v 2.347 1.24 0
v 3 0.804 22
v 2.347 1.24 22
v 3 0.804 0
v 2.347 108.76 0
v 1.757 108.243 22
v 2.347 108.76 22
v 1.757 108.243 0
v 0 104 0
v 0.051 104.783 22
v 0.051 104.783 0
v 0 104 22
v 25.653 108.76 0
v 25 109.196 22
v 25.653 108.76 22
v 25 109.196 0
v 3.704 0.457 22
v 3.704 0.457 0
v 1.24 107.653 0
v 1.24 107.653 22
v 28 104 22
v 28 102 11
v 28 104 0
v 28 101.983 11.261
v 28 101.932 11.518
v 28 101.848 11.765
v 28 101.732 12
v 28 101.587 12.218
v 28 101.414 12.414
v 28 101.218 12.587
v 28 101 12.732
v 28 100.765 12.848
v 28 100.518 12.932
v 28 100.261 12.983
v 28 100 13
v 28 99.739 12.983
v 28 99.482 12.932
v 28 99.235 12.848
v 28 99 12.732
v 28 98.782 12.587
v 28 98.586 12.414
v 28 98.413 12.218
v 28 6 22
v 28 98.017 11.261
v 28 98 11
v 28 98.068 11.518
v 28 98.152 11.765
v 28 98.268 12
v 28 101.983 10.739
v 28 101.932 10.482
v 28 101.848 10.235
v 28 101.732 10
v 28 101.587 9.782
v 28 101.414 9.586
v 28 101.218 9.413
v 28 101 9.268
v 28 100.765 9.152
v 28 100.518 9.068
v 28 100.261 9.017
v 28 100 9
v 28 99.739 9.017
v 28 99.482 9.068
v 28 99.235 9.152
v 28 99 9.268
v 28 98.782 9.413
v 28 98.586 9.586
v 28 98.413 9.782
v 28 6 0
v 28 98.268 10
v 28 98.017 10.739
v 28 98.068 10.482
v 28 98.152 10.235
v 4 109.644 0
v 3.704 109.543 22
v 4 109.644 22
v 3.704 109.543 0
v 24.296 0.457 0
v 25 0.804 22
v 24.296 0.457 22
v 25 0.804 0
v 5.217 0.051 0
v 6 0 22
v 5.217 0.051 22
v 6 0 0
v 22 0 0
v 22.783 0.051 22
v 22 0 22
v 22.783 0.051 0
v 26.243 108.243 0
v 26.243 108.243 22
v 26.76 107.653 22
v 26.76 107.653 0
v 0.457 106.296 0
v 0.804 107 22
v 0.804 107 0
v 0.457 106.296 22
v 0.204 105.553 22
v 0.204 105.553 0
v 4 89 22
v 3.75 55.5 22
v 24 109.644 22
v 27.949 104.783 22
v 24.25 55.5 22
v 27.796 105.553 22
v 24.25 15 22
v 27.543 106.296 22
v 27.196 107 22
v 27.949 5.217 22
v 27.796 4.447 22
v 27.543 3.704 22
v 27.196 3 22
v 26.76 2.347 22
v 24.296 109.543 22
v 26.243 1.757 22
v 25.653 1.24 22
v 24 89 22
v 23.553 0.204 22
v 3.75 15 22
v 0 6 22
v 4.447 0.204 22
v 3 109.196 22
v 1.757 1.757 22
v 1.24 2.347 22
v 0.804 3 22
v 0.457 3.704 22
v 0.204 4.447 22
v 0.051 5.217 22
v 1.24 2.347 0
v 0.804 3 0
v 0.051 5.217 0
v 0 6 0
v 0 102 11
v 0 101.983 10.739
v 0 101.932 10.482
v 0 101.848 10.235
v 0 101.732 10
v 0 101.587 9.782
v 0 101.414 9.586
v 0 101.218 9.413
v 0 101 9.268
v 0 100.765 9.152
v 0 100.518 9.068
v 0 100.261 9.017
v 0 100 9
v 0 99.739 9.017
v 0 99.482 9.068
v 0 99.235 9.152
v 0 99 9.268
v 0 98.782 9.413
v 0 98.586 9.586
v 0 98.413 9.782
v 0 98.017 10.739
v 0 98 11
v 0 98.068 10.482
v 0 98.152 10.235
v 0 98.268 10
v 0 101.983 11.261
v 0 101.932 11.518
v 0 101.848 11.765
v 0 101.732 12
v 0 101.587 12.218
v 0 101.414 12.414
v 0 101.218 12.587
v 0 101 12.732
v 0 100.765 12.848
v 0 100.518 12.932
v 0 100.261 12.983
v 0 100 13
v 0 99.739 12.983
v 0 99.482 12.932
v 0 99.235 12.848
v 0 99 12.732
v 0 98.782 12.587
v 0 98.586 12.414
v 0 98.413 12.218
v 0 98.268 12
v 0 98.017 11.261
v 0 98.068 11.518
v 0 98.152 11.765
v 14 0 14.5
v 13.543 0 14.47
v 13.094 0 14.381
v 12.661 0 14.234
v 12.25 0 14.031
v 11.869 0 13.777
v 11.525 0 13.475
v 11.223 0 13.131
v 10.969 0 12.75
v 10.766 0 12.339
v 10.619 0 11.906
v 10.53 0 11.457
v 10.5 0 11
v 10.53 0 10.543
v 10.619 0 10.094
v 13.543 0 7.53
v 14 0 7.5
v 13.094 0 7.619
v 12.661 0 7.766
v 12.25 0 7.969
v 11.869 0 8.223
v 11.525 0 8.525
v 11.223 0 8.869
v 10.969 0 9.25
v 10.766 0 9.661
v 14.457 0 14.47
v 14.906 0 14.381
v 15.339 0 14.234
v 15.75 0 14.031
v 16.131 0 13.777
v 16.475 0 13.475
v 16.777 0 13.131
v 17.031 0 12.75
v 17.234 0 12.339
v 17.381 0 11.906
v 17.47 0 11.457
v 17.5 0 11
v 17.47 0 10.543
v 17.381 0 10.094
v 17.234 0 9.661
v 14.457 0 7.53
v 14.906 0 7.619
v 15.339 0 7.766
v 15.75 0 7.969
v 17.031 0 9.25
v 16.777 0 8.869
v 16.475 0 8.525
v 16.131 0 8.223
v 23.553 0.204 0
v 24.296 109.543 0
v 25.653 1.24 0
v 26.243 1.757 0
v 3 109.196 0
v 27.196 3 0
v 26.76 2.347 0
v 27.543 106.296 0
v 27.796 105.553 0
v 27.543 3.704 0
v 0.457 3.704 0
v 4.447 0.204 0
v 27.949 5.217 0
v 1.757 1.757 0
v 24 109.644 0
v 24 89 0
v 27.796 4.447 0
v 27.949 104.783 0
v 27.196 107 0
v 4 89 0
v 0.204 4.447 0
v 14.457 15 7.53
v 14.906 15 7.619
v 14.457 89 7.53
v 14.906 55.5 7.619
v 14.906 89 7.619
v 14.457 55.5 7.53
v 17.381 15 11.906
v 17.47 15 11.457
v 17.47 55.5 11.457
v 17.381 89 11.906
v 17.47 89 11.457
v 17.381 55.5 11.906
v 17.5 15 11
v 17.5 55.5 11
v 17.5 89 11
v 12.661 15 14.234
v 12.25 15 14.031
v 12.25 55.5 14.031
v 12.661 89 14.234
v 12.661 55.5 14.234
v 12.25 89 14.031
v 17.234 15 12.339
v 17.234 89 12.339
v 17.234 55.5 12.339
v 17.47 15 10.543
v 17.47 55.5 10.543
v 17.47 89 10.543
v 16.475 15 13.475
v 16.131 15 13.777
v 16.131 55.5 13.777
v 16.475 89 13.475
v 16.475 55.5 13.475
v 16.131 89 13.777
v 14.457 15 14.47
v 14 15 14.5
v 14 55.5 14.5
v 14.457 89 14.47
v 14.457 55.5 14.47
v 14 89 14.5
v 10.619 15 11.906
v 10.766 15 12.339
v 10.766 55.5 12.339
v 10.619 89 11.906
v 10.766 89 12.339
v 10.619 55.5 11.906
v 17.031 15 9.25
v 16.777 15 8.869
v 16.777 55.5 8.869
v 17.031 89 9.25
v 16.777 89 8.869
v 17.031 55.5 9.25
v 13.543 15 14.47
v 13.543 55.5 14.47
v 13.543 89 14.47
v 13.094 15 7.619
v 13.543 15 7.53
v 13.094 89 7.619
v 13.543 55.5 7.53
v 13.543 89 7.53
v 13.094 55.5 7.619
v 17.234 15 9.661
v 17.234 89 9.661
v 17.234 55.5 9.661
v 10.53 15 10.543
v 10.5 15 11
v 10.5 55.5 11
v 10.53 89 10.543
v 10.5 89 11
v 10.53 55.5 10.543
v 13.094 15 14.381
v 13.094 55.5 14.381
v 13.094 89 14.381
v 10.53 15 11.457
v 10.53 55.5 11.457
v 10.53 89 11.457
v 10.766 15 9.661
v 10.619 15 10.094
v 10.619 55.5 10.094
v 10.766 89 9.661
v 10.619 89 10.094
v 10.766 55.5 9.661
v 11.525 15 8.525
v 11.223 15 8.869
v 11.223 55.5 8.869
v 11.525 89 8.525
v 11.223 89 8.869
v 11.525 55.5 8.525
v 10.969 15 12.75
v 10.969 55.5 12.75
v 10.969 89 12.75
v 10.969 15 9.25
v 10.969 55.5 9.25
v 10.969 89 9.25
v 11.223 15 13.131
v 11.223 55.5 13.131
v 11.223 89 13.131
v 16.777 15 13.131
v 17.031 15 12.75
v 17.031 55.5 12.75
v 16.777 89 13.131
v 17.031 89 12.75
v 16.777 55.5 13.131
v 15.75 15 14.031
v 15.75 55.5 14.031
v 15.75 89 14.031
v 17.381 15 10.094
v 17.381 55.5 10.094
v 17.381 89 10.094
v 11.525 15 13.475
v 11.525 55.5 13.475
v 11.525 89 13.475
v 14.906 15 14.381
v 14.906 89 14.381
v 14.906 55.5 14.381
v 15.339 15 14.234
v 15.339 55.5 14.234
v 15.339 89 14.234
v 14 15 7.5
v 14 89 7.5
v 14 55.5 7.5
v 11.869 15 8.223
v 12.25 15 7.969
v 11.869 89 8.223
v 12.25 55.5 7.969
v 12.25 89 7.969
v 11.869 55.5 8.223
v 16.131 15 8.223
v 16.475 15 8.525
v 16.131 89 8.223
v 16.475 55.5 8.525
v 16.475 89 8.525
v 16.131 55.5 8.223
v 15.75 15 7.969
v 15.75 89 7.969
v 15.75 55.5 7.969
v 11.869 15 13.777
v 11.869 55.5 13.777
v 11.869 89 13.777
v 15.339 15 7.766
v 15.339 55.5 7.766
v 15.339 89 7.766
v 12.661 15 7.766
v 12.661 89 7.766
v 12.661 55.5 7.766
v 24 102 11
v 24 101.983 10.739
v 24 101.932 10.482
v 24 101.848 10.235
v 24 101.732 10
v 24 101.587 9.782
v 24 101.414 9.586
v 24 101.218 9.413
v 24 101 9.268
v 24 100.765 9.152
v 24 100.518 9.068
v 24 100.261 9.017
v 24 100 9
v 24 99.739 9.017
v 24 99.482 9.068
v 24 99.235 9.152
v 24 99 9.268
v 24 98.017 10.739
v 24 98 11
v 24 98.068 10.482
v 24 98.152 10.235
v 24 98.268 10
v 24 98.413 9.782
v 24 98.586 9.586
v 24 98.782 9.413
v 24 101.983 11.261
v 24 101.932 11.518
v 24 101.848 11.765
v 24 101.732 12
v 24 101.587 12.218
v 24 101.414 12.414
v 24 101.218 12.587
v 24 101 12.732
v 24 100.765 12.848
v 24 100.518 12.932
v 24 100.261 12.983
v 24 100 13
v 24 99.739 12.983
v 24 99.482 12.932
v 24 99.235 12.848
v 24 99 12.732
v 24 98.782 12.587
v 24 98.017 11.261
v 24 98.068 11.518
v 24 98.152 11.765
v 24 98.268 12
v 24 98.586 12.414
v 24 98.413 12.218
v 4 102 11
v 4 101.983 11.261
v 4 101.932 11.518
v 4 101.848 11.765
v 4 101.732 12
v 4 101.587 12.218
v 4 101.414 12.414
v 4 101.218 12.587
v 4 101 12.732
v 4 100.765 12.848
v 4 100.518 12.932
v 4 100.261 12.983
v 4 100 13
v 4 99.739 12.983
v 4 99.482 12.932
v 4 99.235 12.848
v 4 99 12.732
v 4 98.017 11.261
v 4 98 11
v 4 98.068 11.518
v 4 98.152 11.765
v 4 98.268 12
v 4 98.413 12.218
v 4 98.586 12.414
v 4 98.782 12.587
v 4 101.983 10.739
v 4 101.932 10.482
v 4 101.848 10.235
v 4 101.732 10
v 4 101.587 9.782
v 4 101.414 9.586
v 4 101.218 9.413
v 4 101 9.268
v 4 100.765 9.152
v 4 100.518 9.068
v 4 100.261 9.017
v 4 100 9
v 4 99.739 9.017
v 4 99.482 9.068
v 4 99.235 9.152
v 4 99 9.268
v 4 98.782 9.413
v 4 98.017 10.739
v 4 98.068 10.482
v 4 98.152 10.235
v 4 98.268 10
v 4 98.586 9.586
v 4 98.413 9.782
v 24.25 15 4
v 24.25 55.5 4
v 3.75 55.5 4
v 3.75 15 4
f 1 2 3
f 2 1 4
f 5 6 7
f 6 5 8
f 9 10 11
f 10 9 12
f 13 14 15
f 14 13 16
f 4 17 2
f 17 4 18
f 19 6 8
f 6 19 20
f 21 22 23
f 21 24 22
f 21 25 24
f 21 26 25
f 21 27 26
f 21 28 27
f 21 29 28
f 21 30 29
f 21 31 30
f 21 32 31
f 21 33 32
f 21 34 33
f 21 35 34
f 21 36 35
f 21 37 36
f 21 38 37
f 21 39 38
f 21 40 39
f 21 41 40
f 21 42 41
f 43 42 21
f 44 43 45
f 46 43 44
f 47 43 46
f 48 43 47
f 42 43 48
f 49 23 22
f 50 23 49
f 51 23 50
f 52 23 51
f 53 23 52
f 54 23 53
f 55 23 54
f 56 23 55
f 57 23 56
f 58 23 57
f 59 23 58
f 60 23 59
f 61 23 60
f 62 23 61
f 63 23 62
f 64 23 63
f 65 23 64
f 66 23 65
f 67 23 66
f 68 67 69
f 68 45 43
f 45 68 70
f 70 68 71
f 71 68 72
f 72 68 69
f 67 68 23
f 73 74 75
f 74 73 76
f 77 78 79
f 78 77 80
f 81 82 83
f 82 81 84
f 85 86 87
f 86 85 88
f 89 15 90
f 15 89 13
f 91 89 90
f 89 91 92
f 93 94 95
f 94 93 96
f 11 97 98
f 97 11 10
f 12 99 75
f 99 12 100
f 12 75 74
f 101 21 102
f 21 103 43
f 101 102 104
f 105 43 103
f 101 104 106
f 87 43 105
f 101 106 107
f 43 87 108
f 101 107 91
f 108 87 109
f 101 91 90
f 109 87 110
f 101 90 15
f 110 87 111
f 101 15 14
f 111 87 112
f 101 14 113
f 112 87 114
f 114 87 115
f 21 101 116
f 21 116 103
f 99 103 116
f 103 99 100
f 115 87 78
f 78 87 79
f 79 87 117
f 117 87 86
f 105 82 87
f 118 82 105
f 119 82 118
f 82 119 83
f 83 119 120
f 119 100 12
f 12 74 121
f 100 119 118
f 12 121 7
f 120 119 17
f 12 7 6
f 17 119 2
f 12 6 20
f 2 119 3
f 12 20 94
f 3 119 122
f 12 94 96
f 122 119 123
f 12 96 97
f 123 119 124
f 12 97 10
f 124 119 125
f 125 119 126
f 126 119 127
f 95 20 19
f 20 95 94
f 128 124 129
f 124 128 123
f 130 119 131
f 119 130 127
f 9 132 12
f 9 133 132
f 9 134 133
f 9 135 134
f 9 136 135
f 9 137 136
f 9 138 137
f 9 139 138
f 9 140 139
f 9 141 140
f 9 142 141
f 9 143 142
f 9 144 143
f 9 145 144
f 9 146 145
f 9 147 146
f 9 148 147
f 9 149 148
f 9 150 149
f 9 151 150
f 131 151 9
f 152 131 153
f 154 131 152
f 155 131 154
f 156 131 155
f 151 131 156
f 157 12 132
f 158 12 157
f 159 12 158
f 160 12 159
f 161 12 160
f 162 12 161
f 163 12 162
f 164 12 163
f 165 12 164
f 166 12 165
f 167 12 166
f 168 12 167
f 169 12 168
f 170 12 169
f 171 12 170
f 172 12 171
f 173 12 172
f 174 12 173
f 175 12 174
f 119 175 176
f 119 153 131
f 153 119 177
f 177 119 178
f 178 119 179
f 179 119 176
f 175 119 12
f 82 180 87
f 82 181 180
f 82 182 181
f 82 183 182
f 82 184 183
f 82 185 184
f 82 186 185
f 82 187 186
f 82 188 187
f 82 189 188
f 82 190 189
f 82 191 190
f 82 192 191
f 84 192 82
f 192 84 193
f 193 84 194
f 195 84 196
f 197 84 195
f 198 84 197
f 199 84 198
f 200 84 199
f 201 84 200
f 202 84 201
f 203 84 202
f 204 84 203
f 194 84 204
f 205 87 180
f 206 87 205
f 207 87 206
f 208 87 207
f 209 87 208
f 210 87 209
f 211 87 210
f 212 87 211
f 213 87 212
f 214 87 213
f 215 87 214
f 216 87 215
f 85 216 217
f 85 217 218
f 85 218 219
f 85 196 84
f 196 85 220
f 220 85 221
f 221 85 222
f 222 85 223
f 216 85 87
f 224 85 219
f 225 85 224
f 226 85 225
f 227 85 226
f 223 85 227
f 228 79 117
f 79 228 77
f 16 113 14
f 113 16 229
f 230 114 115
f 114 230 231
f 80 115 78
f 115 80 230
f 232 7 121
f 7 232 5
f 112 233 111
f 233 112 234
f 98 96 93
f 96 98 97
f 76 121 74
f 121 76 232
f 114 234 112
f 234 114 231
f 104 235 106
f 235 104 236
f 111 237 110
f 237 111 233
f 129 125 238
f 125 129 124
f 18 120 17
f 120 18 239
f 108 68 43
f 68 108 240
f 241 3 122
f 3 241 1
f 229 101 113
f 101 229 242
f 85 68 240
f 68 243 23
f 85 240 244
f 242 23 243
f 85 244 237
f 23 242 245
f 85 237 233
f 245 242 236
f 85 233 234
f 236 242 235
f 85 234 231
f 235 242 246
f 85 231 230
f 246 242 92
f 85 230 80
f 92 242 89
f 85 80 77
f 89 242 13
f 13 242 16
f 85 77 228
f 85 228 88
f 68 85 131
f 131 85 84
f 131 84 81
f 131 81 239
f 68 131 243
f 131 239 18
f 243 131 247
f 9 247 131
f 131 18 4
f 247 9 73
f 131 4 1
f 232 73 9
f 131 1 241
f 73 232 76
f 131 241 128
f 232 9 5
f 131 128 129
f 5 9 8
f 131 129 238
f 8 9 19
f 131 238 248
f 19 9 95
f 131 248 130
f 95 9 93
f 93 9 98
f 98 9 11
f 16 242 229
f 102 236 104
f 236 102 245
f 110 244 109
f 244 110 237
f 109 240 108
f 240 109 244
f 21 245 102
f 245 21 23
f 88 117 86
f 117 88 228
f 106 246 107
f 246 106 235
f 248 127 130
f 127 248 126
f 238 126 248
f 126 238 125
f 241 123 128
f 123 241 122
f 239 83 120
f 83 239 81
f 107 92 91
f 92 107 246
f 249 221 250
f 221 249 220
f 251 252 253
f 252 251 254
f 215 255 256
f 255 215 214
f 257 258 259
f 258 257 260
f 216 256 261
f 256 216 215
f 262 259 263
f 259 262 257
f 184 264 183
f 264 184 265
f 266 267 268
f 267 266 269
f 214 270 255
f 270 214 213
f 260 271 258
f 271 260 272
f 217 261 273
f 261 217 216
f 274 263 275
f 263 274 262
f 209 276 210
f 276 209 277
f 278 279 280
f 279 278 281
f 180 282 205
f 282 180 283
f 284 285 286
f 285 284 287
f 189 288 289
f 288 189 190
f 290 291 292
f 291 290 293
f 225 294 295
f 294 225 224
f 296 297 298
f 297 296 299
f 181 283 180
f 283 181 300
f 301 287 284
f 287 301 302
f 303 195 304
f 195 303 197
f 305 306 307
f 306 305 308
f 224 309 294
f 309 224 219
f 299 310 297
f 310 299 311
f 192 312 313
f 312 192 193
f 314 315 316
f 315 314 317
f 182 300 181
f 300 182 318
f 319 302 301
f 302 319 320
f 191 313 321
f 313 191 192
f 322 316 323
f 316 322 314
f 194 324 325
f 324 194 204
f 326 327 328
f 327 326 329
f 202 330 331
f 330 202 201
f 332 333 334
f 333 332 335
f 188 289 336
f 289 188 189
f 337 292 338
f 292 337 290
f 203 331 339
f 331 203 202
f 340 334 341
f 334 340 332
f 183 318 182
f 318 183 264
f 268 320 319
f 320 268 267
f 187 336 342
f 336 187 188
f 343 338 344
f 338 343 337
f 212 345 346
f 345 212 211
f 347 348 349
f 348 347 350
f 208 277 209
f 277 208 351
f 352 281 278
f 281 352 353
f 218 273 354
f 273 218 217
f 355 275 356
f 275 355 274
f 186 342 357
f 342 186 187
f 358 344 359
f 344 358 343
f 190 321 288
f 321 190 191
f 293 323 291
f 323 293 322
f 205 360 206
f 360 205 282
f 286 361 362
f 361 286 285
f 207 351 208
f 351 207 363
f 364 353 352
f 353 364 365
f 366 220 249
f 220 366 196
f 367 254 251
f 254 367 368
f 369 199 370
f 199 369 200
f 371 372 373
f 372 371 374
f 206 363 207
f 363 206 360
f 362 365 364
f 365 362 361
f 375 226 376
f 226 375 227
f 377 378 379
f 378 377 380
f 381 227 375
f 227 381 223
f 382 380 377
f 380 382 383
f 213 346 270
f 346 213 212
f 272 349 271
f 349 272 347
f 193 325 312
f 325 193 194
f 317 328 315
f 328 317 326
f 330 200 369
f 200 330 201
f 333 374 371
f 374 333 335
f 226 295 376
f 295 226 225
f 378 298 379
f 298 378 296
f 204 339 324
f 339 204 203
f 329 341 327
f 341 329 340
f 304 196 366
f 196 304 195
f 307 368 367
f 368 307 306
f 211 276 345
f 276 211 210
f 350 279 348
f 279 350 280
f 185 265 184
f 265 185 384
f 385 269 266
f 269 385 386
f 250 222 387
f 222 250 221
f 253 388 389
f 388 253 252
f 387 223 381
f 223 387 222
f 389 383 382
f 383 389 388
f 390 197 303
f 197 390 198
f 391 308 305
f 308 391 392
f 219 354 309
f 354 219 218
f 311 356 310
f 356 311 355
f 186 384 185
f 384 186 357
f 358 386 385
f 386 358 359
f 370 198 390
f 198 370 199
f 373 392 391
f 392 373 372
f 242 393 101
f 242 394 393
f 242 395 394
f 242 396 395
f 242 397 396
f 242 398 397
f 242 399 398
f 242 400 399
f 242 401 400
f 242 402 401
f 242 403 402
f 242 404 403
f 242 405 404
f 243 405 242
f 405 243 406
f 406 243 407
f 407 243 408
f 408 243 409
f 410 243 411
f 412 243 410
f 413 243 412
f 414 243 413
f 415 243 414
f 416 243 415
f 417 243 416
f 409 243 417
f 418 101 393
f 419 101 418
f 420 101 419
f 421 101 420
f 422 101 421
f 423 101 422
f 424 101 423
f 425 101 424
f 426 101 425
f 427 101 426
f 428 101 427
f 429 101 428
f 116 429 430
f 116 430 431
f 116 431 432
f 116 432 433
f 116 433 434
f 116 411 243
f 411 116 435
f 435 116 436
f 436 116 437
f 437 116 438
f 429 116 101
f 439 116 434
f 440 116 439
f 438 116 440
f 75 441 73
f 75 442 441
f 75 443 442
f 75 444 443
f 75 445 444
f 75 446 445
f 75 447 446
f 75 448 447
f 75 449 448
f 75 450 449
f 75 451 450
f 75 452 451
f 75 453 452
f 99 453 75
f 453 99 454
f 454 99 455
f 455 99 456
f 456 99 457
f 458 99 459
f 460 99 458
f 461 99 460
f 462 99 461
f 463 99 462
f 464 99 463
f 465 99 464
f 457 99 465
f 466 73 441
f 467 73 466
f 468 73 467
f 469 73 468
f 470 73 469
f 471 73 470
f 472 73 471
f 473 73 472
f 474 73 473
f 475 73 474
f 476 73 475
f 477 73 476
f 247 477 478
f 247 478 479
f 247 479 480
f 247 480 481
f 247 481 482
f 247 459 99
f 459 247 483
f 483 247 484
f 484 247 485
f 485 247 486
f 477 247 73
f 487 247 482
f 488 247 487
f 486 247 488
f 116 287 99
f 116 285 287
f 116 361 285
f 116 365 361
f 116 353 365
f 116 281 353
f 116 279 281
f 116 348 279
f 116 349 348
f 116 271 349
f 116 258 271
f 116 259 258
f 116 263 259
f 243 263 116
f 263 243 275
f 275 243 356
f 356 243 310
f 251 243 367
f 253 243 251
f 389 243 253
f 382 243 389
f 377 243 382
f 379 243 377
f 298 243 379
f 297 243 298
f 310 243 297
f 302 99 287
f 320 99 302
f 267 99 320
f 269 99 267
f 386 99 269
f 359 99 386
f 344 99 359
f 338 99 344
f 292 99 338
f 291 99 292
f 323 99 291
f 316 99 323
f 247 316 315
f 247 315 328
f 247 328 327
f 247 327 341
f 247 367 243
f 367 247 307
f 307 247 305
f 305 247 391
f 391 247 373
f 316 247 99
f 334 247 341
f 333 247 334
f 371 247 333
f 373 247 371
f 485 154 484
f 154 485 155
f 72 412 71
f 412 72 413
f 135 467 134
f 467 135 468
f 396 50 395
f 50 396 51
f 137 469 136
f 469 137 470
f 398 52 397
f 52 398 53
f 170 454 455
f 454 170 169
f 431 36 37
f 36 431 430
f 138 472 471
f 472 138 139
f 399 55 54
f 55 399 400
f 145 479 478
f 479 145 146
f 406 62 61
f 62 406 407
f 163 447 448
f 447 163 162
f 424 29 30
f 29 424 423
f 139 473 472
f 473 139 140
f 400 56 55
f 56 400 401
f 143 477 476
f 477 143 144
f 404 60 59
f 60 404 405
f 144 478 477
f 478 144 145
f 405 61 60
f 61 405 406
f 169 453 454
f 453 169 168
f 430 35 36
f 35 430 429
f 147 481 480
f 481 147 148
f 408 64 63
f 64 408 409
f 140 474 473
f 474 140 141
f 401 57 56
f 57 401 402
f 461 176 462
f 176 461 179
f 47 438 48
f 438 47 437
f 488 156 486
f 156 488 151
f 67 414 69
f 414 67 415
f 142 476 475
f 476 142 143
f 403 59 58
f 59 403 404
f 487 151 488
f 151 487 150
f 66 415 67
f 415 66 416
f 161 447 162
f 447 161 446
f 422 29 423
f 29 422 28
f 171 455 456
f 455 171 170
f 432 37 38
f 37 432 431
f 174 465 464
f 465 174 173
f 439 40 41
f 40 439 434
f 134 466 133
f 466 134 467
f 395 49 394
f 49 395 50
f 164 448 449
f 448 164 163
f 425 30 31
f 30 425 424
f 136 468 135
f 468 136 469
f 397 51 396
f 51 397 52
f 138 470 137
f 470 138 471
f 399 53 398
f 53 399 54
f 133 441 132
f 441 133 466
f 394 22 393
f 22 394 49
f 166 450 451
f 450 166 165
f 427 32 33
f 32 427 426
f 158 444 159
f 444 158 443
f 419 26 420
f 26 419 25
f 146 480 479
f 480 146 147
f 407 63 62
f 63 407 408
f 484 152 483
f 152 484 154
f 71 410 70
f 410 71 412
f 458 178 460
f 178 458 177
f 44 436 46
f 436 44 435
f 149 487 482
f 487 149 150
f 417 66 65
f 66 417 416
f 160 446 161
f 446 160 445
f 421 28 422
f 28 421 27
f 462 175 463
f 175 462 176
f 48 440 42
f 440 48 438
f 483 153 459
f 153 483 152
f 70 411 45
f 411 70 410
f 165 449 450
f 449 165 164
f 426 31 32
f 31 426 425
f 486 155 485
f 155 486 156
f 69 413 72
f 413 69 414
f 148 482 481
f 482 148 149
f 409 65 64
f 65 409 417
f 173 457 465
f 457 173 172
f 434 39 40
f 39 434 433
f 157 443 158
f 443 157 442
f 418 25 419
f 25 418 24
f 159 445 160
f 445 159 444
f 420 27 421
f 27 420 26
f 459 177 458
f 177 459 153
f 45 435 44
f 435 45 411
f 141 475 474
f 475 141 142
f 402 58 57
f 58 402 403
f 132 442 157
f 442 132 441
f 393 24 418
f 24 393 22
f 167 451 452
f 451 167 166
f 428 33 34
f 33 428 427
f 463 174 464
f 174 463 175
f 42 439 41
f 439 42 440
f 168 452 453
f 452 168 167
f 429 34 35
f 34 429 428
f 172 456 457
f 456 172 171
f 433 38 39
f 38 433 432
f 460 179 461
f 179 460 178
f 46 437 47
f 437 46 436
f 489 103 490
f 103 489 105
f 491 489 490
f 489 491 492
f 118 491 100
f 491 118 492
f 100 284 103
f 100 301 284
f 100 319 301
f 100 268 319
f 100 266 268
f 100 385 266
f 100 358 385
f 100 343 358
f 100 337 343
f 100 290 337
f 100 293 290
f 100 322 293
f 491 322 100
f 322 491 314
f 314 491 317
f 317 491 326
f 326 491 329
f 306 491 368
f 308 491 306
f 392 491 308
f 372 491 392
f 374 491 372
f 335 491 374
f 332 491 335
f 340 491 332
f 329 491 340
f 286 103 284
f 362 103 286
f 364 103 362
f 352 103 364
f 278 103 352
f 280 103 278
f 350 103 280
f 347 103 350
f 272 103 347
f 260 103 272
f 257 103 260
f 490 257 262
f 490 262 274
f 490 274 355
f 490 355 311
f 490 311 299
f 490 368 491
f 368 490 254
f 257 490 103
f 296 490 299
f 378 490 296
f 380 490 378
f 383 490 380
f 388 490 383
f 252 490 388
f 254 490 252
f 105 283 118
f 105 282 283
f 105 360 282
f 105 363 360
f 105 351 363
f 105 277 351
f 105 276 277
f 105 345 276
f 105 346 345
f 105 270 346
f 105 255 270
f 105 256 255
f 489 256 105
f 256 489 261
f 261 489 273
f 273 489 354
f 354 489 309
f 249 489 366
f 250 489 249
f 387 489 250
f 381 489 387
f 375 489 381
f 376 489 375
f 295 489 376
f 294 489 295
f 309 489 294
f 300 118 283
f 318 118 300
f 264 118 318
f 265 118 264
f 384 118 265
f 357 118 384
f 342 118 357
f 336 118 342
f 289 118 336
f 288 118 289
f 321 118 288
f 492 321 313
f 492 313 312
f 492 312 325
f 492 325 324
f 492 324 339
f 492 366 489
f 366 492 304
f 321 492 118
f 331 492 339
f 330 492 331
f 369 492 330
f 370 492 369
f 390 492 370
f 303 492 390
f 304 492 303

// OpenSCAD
// Unit-1 Bipedal Endoskeleton: Femur & Knee Clevis Segment
// Units: mm

$fn = 48;

// --- Parameters ---
bone_length     = 110.0;
bone_width      = 28.0;
bone_depth      = 22.0;
outer_radius    = 6.0;   // Radiused corners prevent cutting or pinching skin

servo_pocket_w  = 20.5;
servo_pocket_l  = 40.5;
servo_pocket_d  = 18.0;

wire_tunnel_dia = 7.0;   // Internal conduit down the neutral bending axis
pivot_pin_dia   = 4.0;   // Knee hinge bolt (M4)

module smooth_bar(l, w, d, r) {
    hull() {
        translate([r, r, 0]) cylinder(r=r, h=d);
        translate([w - r, r, 0]) cylinder(r=r, h=d);
        translate([r, l - r, 0]) cylinder(r=r, h=d);
        translate([w - r, l - r, 0]) cylinder(r=r, h=d);
    }
}

module femur_segment() {
    difference() {
        // Outer bone body with smooth continuous fillets
        smooth_bar(bone_length, bone_width, bone_depth, outer_radius);

        // Internal central wire tunnel along neutral bending axis
        translate([bone_width/2, bone_length/2, bone_depth/2])
            rotate([90, 0, 0])
            cylinder(r=wire_tunnel_dia/2, h=bone_length + 2, center=true);

        // Knee joint clevis cutout (Dual-shear pocket)
        translate([bone_width/2, bone_length - 10, bone_depth/2])
            cube([bone_width - 8, 22, bone_depth + 2], center=true);

        // Transverse pivot hole for knee hinge pin
        translate([-1, bone_length - 10, bone_depth/2])
            rotate([0, 90, 0])
            cylinder(r=pivot_pin_dia/2, h=bone_width + 2);

        // Recess for serial servo mounting
        translate([(bone_width - servo_pocket_w)/2, 15, bone_depth - servo_pocket_d])
            cube([servo_pocket_w, servo_pocket_l, servo_pocket_d + 1]);
    }
}

femur_segment();
